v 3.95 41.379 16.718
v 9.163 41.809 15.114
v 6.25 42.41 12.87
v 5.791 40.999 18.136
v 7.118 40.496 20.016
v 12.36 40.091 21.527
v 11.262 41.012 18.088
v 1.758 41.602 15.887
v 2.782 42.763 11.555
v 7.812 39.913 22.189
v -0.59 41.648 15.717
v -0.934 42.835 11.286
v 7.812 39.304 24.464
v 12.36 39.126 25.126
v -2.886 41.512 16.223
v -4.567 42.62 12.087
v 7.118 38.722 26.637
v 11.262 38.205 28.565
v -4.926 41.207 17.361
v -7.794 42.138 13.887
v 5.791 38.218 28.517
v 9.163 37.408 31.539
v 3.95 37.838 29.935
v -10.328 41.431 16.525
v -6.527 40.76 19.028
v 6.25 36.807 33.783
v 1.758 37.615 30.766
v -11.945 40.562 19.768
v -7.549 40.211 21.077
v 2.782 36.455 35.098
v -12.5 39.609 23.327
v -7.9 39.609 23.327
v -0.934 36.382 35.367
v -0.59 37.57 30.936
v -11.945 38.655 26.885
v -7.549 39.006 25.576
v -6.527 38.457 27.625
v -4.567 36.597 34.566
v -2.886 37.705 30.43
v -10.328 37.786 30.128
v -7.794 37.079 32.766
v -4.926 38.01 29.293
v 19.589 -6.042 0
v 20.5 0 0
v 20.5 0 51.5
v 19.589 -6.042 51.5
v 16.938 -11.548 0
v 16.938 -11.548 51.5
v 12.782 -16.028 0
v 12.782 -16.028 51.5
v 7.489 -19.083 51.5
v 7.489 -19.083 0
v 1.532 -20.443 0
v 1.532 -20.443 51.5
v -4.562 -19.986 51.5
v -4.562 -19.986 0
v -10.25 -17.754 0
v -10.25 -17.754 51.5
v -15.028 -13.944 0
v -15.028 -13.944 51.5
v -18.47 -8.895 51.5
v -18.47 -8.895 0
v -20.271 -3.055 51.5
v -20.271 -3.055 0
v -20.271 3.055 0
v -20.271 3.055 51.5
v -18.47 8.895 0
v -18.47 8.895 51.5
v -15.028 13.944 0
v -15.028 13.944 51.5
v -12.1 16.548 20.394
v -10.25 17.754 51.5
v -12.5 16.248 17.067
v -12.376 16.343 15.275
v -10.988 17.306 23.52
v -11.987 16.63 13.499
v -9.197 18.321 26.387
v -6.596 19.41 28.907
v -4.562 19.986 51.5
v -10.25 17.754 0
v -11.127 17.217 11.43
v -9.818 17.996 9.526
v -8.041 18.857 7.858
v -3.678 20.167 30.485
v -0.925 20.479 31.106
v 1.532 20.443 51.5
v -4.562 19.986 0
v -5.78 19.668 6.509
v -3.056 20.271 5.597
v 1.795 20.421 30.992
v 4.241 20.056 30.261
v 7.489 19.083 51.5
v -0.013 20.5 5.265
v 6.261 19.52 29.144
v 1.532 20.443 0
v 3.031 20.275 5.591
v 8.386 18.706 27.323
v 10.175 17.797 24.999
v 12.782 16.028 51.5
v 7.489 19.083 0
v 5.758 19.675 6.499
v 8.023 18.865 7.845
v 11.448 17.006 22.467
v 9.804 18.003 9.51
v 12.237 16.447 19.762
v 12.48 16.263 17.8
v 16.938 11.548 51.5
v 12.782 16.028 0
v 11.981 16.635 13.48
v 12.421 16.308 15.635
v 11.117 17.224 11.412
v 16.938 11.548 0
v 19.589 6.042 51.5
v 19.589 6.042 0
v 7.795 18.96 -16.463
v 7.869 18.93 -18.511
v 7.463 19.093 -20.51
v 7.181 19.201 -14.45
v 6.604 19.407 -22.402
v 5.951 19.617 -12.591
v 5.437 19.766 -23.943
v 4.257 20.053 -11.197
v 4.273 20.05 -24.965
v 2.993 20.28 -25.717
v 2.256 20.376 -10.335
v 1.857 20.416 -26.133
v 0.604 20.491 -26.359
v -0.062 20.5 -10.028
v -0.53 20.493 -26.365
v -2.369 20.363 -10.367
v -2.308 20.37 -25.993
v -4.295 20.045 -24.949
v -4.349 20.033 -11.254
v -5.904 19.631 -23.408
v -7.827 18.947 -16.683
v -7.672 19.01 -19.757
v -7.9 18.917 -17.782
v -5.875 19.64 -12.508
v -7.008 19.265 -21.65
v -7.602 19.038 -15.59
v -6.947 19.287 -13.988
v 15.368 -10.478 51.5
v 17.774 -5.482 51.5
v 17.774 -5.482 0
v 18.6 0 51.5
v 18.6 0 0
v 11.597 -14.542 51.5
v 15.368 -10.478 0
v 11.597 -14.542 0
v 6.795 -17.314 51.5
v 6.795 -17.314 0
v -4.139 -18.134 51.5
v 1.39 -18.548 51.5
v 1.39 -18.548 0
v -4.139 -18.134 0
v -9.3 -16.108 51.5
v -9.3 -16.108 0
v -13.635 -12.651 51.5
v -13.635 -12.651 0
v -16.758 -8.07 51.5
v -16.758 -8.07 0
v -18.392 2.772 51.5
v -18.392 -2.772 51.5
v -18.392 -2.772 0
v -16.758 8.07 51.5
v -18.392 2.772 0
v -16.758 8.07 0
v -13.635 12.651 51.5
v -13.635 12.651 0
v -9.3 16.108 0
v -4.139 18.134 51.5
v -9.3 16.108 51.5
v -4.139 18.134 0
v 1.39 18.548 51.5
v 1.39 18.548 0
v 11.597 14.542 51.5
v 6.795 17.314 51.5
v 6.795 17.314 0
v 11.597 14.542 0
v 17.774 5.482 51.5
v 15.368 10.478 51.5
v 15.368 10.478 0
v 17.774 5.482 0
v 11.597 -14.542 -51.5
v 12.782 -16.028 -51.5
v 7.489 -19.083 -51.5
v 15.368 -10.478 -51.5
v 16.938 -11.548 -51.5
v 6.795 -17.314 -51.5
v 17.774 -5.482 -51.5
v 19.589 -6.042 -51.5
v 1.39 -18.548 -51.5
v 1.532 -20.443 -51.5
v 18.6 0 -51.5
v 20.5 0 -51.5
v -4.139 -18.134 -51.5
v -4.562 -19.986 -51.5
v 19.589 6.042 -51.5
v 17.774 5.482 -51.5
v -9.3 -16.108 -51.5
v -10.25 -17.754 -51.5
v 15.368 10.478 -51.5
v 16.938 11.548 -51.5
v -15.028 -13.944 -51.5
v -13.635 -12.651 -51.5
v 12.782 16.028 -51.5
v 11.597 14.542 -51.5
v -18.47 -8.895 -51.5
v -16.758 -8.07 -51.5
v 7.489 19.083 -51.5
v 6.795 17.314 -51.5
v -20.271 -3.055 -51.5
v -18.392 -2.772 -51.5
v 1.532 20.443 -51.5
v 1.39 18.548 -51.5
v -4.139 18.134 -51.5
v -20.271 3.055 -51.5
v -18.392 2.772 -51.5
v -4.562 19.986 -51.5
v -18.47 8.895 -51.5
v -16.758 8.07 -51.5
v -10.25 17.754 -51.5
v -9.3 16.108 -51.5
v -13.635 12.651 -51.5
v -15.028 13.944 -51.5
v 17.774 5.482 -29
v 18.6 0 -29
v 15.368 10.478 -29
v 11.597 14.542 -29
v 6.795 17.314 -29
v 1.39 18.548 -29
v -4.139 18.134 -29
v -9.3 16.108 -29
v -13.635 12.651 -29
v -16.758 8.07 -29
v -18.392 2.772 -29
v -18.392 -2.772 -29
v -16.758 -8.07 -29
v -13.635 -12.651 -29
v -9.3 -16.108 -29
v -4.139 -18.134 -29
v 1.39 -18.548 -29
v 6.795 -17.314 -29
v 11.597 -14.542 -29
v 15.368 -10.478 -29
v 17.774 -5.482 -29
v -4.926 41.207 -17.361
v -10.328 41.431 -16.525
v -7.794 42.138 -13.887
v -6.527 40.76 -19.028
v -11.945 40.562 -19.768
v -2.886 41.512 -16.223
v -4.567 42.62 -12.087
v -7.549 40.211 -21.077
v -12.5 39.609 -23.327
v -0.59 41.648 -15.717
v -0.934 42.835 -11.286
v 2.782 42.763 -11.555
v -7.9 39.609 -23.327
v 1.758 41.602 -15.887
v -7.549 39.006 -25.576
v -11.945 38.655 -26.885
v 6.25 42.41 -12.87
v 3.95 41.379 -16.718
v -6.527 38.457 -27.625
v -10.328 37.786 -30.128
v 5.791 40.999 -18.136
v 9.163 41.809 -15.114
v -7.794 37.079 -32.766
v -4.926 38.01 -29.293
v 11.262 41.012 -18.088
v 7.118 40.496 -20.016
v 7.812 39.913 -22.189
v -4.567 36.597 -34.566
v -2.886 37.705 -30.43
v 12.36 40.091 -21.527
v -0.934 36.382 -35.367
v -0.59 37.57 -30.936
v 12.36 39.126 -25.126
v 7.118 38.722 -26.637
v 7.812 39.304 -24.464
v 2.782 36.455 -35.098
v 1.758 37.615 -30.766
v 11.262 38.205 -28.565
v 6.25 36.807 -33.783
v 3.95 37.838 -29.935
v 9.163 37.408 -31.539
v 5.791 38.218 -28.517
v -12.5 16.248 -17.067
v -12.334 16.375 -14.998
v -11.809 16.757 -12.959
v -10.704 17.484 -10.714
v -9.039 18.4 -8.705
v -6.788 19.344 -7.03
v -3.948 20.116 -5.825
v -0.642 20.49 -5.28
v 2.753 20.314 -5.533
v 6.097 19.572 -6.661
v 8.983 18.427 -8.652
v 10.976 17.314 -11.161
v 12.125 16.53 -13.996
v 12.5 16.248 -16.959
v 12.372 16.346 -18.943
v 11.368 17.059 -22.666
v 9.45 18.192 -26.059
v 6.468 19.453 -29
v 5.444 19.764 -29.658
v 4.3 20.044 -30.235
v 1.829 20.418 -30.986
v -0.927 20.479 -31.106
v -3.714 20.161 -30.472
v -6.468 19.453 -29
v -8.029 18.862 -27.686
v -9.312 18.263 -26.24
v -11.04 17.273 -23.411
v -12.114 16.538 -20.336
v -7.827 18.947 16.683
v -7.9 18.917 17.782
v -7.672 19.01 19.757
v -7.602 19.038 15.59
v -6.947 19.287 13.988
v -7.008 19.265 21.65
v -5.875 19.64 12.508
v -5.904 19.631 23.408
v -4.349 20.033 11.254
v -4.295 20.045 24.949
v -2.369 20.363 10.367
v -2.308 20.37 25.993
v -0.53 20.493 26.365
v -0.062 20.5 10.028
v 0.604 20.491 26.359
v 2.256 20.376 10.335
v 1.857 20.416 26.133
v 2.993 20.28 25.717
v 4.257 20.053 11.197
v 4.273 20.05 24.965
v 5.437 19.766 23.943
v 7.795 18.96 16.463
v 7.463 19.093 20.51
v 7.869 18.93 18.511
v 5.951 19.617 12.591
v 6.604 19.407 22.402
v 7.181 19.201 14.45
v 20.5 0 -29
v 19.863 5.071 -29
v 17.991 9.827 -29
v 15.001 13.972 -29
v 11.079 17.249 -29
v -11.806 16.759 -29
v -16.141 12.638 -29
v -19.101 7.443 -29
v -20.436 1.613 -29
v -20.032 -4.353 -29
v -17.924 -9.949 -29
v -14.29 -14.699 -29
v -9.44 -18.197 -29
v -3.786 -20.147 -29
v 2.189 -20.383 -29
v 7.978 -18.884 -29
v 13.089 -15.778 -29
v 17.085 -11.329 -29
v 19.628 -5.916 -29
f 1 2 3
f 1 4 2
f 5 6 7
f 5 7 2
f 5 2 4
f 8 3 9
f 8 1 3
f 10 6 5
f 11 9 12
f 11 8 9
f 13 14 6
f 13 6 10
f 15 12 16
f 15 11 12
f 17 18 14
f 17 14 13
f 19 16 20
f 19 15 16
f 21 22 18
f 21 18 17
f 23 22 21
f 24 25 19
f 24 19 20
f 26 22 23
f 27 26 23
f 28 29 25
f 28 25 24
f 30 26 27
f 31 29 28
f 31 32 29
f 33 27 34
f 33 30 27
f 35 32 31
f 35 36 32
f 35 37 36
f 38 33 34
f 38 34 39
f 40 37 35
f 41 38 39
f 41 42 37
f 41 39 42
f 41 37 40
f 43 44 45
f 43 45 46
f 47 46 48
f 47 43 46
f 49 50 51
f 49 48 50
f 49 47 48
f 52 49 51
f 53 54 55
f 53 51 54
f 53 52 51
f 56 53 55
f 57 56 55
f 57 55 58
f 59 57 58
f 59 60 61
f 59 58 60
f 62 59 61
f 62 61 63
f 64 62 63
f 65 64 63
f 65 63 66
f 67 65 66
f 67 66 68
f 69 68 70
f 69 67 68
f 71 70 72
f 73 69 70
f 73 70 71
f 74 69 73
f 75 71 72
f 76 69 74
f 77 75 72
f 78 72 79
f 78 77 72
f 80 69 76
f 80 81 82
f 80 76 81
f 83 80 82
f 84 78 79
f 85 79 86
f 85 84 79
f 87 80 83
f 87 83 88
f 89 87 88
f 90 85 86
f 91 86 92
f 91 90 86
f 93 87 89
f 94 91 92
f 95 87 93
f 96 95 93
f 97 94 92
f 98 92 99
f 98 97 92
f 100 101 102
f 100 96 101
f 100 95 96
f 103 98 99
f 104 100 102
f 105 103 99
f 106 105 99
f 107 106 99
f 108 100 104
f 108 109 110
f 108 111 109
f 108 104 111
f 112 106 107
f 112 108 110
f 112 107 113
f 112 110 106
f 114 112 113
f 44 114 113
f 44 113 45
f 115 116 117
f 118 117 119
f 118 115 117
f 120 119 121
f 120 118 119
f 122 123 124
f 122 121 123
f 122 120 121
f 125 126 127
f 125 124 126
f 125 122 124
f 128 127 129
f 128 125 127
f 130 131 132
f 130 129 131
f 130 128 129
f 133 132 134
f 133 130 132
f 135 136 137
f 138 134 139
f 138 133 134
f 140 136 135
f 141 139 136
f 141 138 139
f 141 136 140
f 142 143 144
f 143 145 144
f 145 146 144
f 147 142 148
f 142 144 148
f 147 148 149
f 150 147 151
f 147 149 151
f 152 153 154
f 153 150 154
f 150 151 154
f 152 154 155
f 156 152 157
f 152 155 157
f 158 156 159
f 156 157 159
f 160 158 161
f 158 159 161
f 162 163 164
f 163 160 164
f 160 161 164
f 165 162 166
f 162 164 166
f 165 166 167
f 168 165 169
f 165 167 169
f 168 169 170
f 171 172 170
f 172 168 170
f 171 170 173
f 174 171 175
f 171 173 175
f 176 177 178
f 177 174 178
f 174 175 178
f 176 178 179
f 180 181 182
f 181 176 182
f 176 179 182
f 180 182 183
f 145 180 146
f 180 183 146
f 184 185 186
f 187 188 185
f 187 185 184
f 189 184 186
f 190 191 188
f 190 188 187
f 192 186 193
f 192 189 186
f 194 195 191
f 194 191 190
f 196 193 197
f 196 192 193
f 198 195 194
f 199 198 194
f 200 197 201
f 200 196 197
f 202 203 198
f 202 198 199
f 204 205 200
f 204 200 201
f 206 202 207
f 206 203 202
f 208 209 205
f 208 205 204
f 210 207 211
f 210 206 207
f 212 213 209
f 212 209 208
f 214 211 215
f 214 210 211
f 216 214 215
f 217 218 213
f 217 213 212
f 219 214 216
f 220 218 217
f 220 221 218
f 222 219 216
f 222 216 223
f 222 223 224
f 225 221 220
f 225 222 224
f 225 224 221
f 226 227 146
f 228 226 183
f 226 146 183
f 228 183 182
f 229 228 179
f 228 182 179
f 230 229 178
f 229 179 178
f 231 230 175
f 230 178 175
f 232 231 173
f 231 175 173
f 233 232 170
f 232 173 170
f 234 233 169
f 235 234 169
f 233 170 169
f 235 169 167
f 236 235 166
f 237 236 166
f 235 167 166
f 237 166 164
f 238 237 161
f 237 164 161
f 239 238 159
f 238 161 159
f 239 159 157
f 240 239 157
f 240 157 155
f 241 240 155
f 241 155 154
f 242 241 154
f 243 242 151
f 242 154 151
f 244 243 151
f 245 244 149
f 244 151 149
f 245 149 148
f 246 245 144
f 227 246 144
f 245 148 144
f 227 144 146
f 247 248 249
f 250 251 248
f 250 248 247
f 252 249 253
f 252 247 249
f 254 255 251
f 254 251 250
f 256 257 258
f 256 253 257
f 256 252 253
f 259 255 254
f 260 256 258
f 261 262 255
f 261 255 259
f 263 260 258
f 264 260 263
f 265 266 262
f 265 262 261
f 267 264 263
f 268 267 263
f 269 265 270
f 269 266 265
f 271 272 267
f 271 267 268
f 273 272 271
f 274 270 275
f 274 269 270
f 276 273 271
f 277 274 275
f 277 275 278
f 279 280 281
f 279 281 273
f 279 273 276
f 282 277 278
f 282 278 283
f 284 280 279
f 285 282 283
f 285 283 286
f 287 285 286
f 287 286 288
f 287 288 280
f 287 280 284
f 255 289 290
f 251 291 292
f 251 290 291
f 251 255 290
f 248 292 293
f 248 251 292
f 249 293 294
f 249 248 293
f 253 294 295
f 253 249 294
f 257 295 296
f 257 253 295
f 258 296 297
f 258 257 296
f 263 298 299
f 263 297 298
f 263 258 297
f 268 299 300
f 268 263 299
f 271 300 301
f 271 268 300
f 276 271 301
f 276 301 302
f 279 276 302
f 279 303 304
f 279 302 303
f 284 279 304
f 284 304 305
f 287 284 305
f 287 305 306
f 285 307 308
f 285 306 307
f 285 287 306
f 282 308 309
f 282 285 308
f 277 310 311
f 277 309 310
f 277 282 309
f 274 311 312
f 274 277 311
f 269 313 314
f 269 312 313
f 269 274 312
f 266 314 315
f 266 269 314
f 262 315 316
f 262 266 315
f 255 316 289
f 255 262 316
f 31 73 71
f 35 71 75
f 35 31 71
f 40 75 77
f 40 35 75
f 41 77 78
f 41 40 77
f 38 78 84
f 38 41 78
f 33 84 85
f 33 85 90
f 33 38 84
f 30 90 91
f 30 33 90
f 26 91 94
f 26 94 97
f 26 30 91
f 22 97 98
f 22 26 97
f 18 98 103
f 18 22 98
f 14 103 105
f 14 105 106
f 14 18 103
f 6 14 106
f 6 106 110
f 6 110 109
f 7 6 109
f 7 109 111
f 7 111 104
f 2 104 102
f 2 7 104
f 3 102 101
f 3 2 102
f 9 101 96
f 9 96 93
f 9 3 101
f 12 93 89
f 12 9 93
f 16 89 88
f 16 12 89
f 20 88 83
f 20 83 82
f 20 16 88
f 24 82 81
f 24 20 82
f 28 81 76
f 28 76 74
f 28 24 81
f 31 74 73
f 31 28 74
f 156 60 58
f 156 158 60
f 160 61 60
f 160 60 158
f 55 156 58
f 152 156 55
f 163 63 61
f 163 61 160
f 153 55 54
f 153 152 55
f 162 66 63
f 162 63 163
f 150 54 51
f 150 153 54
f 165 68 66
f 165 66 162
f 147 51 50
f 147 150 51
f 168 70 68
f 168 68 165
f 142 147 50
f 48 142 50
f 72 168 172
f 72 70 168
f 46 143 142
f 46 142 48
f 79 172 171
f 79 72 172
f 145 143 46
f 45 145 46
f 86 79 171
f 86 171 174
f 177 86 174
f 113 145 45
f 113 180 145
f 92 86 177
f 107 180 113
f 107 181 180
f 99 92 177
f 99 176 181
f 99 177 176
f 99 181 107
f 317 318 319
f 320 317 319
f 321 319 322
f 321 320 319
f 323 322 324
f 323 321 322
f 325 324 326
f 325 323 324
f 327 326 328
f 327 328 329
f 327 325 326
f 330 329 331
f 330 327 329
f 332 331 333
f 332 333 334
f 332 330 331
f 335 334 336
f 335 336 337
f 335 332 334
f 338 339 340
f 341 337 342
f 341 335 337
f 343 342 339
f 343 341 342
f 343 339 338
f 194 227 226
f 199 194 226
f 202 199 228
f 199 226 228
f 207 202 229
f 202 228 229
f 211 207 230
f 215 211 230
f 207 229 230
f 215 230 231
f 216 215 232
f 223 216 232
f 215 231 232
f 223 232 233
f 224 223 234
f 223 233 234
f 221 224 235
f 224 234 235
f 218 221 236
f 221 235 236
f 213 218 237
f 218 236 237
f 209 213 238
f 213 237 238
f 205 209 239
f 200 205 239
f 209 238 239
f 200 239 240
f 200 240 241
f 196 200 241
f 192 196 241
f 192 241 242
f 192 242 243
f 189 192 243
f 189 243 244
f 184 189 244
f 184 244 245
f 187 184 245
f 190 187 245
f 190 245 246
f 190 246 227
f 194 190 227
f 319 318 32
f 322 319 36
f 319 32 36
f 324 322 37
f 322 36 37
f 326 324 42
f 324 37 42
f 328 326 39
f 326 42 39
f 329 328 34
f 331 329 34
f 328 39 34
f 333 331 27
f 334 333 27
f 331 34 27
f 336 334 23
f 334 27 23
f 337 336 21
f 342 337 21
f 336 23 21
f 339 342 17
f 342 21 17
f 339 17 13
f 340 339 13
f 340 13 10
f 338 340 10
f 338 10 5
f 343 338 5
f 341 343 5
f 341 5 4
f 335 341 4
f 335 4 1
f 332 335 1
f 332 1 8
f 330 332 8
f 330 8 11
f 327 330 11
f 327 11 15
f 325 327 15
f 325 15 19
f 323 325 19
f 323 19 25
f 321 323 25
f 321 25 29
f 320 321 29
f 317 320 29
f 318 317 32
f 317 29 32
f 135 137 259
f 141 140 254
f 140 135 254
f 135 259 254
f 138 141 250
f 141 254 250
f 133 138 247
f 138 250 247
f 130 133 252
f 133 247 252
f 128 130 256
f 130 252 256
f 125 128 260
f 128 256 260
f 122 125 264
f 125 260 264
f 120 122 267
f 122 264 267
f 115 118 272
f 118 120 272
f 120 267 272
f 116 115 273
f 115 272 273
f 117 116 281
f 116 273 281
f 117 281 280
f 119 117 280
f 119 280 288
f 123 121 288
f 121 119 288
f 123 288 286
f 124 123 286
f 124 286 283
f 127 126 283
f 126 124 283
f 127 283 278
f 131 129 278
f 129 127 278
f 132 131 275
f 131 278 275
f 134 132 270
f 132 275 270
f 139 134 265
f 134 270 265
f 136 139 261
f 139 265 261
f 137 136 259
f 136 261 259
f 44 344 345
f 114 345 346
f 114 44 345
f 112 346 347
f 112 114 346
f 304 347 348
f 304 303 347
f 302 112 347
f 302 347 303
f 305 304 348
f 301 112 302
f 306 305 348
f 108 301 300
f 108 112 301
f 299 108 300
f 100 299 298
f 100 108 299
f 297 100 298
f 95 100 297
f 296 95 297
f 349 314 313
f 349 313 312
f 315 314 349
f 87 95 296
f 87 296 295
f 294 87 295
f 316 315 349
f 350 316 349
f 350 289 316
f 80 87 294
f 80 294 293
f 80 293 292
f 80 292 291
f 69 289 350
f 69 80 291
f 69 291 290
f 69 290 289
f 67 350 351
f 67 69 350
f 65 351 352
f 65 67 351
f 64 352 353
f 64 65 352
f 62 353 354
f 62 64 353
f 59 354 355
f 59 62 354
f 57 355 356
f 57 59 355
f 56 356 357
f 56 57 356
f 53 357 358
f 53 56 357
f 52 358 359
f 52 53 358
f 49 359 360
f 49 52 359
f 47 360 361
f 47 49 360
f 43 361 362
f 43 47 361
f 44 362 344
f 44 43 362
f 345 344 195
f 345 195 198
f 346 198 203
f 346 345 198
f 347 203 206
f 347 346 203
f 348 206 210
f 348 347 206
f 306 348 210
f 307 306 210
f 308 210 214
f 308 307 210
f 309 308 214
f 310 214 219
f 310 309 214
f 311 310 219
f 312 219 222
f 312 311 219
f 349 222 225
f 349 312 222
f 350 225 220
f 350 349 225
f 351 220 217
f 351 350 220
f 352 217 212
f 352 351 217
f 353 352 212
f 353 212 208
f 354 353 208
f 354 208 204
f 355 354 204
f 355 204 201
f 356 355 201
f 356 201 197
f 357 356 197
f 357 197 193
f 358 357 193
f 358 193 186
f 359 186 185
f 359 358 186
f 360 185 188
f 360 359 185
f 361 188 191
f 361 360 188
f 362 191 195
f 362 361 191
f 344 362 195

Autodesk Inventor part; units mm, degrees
sketch "Sketch1" plane through (0, 0, 0) normal (0, 0, 1) x (1, 0, 0)
  circle A0 centre (0, 0) radius 18.6
  circle A1 centre (0, 0) radius 20.5
  dimension "d0" = 37.2
  dimension "d1" = 41
extrude "Extrusion1" add sketch "Sketch1" along normal blind 29
ref_plane "Work Plane1" through (0, 0, 0) normal (0, 1, 0) x (0, 0, 1)
ref_plane "Work Plane2" through (0, 40.5, 0) normal (0, 1, 0) x (0, 0, 1)
sketch "Sketch3" plane through (0, 0, 29) normal (0, 0, 1) x (1, 0, 0)
  circle A0 centre (0, 0) radius 20.5 projected
  circle A1 centre (0, 0) radius 18.6 projected
extrude "Extrusion3" add sketch "Sketch3" along normal blind 22.5
ref_plane "Work Plane3" through (0, 20.5, 0) normal (0, 1, 0) x (-1, 0, 0)
sketch "Sketch5" plane through (0, 40.5, 0) normal (0, 1, 0) x (0, 0, 1)
  line L0 (0, -20.5) -> (0, 20.5) projected
  line L1 (20, 20.5) -> (20, -20.5)
  point P0 (0, 0)
  dimension "d29" = 20
ref_plane "Work Plane4" through (20.5, 40.5, 20) normal (0, 0.9659, 0.2588) x (-1, 0, 0)
sketch "Sketch8" plane through (20.5, 40.5, 20) normal (0, 0.9659, 0.2588) x (-1, 0, 0)
  circle A0 centre (20.5, 3.4439) radius 12.5
  circle A1 centre (20.5, 3.4439) radius 7.9
  point P0 (20.5, -8.8363)
  dimension "d44" = 25
  dimension "d45" = 15.8
extrude "Extrusion6" add sketch "Sketch8" against normal up to surface
mirror "Mirror3" about plane through (0, 0, 0) normal (0, 0, 1) of "Extrusion1", "Extrusion6", "Extrusion3"
properties part number "JuntaEjeCadera" material "PLA"
